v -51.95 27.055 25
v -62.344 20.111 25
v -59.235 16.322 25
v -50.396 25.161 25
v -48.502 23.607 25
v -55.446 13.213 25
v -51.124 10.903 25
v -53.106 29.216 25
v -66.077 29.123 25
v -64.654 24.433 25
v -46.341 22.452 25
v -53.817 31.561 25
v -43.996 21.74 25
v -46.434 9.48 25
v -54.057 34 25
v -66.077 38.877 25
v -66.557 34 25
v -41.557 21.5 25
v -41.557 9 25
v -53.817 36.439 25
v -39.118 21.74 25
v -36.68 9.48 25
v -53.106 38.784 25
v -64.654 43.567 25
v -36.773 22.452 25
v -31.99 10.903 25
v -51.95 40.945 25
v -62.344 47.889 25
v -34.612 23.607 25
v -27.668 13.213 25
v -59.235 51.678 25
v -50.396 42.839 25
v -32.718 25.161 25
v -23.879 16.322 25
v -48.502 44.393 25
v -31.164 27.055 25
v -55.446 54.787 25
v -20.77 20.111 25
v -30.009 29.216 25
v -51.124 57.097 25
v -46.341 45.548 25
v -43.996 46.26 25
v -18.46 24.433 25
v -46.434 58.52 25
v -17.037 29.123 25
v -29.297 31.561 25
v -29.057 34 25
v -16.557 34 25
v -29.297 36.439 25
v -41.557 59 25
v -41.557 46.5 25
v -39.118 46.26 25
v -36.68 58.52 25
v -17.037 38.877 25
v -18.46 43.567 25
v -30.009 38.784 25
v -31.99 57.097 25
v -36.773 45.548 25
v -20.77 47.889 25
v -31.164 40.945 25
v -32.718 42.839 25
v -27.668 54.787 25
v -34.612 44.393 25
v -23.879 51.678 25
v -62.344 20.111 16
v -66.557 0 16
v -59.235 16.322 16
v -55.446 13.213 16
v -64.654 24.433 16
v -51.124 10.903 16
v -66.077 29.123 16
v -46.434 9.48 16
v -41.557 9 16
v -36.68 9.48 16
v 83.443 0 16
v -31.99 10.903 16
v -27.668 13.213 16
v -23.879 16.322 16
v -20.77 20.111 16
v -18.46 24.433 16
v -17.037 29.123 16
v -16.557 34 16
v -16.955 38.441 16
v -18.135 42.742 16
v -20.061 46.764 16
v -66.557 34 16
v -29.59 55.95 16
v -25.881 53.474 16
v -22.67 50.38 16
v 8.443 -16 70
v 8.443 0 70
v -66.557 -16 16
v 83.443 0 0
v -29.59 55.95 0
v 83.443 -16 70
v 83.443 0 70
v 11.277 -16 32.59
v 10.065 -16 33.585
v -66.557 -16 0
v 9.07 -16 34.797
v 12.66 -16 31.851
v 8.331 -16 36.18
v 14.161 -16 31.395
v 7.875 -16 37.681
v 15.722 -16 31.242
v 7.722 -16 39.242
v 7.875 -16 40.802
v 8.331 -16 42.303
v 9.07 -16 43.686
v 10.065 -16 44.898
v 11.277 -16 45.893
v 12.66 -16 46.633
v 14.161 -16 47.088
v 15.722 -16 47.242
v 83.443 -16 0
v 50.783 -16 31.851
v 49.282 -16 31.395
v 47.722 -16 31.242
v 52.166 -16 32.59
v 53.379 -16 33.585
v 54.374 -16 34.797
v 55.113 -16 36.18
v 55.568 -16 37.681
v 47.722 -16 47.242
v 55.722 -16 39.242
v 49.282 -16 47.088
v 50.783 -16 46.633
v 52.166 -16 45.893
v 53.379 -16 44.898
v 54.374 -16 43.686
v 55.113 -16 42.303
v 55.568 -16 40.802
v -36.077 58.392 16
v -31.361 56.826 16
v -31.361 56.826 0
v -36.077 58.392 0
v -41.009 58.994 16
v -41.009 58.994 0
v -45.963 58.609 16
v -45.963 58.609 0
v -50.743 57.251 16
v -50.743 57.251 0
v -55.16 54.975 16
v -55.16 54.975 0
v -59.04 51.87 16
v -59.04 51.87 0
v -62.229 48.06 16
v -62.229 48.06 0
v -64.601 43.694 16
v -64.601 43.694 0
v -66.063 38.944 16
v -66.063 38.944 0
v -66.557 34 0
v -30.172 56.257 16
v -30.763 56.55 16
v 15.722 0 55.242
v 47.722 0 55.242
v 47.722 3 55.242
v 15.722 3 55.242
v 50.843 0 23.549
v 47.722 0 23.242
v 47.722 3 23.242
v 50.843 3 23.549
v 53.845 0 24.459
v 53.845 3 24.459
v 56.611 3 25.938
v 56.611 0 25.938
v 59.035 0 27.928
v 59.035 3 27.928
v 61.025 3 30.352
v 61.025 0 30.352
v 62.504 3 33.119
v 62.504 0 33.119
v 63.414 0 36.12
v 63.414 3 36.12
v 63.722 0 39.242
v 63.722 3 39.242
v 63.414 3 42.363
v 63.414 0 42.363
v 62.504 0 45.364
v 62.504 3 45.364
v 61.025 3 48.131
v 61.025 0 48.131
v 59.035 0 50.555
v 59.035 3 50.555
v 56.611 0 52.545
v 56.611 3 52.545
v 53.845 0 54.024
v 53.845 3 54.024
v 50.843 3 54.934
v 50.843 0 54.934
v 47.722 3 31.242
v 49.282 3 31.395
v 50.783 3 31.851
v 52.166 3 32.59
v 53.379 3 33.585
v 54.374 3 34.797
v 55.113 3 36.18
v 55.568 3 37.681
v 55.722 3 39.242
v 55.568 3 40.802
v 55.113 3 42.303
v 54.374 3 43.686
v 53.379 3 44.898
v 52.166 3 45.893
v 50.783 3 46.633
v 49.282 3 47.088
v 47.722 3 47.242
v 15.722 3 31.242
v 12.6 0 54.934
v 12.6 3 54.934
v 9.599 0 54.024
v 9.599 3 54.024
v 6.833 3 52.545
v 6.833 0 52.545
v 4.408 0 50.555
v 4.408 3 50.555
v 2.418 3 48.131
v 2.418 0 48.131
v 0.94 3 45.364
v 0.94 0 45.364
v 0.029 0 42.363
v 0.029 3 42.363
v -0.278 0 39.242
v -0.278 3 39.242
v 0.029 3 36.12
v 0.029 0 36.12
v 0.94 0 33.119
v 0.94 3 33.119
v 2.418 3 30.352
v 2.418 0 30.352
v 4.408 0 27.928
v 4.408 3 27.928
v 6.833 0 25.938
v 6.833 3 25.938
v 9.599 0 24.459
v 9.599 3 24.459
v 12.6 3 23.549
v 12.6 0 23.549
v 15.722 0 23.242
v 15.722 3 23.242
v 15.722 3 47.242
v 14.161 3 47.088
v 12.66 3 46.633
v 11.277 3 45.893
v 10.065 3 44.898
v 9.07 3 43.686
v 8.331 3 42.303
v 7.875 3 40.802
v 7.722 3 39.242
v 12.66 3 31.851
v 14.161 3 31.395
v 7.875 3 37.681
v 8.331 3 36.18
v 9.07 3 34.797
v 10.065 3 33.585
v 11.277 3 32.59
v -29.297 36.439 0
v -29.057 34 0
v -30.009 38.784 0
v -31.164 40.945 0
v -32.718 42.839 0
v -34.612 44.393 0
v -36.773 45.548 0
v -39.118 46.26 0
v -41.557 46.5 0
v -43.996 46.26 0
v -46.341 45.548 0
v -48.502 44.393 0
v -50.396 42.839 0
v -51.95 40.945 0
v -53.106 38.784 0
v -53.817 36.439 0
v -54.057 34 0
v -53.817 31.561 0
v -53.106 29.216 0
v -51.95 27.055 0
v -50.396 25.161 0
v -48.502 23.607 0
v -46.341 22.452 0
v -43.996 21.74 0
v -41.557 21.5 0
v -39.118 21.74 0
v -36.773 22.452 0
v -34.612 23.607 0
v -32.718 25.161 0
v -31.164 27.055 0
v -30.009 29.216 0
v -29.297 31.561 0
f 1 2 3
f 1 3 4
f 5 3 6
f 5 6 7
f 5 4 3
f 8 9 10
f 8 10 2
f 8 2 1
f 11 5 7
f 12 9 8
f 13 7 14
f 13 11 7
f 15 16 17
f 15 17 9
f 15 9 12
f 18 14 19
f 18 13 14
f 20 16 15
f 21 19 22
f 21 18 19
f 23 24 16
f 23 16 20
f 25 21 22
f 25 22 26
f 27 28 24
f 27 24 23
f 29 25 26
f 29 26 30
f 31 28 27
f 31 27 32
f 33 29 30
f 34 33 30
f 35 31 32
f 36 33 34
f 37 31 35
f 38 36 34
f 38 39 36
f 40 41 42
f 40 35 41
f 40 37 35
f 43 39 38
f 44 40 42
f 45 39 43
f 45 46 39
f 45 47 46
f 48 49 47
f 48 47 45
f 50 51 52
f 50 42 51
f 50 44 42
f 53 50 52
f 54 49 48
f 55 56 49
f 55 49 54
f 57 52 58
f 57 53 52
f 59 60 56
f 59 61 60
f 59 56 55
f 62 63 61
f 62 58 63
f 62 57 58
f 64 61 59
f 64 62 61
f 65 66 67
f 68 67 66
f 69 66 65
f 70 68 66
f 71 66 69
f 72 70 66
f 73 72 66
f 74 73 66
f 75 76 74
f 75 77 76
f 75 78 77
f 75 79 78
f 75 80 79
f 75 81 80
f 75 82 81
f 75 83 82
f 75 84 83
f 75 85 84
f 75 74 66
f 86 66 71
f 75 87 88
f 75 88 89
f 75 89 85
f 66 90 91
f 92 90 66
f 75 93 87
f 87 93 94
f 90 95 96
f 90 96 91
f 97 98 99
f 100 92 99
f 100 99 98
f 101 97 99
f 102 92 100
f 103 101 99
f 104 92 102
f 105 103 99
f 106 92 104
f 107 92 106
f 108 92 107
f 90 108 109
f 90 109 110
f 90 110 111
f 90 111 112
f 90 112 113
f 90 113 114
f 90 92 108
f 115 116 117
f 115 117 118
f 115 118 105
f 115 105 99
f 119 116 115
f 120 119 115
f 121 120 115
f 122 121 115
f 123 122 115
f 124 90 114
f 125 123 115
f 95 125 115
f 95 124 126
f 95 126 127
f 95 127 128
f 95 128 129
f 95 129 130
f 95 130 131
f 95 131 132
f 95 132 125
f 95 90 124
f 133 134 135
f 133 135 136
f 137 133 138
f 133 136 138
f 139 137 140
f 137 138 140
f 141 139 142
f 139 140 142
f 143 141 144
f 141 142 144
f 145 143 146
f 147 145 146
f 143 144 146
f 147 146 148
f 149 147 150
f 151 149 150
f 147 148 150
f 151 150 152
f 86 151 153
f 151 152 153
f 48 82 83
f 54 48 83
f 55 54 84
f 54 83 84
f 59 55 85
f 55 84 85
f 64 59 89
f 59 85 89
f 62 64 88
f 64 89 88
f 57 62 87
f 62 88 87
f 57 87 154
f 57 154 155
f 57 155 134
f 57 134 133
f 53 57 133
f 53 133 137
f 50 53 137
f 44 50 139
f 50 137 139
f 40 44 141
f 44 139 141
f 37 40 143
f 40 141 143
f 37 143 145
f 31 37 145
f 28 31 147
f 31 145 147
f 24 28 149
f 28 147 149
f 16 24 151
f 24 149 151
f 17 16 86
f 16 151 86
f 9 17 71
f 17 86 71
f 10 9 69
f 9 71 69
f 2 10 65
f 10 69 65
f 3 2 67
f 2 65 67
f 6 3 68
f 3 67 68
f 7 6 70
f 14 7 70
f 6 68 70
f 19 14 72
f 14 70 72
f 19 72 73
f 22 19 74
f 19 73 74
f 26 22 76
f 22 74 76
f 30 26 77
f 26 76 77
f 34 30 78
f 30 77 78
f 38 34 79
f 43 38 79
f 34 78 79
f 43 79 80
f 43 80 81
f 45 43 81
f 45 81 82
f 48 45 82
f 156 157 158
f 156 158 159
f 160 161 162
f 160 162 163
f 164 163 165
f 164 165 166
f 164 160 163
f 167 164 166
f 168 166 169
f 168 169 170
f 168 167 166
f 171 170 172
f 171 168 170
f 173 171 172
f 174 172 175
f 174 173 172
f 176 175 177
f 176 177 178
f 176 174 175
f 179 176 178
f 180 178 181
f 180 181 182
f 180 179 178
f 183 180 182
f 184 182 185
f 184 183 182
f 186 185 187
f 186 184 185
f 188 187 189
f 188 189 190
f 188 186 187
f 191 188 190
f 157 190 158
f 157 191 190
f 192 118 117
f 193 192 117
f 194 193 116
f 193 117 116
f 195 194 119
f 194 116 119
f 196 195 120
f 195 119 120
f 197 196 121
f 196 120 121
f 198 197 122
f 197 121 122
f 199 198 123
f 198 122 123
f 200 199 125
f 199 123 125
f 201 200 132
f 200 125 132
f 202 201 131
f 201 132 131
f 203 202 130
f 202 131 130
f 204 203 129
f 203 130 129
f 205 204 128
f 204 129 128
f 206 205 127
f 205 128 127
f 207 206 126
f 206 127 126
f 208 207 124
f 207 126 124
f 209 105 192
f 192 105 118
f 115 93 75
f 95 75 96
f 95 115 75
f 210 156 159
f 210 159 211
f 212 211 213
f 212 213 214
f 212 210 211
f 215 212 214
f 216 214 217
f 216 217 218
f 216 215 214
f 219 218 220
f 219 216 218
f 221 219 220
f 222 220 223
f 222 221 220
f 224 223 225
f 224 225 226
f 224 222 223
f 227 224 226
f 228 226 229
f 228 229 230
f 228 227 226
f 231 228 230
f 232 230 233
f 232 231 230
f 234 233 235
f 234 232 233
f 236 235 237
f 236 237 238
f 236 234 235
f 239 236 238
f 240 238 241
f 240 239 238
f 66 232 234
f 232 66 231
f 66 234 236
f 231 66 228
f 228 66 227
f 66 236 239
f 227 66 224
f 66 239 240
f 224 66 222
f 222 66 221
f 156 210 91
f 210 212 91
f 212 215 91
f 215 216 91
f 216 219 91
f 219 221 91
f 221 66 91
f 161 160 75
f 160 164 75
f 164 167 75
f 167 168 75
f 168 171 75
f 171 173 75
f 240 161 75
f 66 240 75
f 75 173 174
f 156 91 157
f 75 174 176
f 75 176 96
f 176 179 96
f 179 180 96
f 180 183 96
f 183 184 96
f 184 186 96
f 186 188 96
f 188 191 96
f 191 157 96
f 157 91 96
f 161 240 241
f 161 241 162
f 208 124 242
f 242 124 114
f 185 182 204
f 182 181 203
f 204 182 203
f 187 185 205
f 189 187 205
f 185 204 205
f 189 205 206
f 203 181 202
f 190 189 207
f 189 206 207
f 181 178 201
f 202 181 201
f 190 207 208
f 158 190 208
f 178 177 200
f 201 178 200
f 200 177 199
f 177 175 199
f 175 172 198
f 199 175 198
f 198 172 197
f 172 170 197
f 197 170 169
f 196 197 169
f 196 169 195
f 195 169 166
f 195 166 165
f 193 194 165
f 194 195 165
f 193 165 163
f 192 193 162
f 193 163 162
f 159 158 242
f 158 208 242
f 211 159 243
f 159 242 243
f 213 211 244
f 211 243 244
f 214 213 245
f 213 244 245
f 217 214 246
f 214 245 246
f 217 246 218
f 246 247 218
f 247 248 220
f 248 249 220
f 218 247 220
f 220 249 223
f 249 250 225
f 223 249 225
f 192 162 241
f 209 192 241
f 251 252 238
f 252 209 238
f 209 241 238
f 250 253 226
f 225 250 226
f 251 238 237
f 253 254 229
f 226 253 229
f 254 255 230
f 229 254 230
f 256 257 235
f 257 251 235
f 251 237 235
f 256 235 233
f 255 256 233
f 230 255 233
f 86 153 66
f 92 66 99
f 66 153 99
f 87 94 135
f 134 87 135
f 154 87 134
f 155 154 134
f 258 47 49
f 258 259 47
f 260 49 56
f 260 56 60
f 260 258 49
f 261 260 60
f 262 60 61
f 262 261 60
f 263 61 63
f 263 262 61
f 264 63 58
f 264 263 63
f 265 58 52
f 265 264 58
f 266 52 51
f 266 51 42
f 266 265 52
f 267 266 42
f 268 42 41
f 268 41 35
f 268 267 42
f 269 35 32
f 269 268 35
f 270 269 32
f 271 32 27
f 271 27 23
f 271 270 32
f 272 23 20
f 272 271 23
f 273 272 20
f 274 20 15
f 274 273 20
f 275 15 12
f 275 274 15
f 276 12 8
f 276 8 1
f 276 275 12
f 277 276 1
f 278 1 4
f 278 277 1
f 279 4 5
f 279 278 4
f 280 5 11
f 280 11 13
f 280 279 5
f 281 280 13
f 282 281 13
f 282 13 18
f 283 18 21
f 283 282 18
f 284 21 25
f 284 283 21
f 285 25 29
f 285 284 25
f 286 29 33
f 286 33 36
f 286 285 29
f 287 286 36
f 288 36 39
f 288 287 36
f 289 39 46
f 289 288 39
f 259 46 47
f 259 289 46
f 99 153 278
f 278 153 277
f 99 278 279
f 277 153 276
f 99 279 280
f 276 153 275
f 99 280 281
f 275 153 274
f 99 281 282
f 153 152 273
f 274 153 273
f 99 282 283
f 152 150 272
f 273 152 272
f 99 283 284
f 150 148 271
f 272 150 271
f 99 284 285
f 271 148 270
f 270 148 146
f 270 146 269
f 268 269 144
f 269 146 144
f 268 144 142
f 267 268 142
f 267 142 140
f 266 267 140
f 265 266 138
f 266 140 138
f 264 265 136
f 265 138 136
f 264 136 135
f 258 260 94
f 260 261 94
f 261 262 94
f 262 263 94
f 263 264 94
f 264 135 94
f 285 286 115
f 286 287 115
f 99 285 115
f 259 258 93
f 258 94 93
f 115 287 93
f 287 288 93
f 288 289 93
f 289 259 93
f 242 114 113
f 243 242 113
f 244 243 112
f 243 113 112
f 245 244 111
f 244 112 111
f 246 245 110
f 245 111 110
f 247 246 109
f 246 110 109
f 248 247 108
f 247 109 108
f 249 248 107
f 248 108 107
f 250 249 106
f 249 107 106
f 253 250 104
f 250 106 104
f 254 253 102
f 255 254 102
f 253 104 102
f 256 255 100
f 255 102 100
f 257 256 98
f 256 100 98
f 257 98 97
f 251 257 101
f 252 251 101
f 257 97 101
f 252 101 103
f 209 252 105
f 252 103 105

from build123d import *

# Parameters (mm, degrees)
SKETCH1_R           = 12.5
SKETCH1_W           = 150
SKETCH1_H           = 16
BOSS_EXTRUDE4_DEPTH = 16
SKETCH6_R           = 25
SKETCH6_R_2         = 12.5
BOSS_EXTRUDE5_DEPTH = 9
BOSS_EXTRUDE6_DEPTH = 16
CUT_EXTRUDE2_DEPTH  = 17
BOSS_EXTRUDE7_DEPTH = 3
CUT_EXTRUDE6_DEPTH  = 60


with BuildPart() as part:
    # Sketch1 → Boss-Extrude4 (new body)
    with BuildSketch(Plane.XY):
        with BuildLine():
            ThreePointArc((-31.360767673, 56.826225363), (-55.160209154, 54.975058449), (-66.55701383, 34))
            ThreePointArc((-66.55701383, 34), (-41.55701383, 9), (-16.55701383, 34))
            ThreePointArc((-16.55701383, 34), (-20.060743341, 46.763634086), (-29.589842236, 55.949642459))
            Line((-29.589842236, 55.949642459), (-31.360767673, 56.826225363))
        make_face()
        with Locations((-41.55701383, 34)):
            Circle(SKETCH1_R, mode=Mode.SUBTRACT)
        with BuildLine():
            Line((-66.55701383, 34), (-66.55701383, 0))
            Line((-66.55701383, 0), (83.44298617, 0))
            Line((83.44298617, 0), (-29.589842236, 55.949642459))
            ThreePointArc((-29.589842236, 55.949642459), (-20.060743341, 46.763634086), (-16.55701383, 34))
            ThreePointArc((-16.55701383, 34), (-41.55701383, 9), (-66.55701383, 34))
        make_face()
        with Locations((8.44298617, -8)):
            Rectangle(SKETCH1_W, SKETCH1_H)
    extrude(amount=BOSS_EXTRUDE4_DEPTH)

    # Sketch6 → Boss-Extrude5 (add)
    with BuildSketch(Plane.XY.offset(16)):
        with Locations((-41.55701383, 34)):
            Circle(SKETCH6_R)
        with Locations((-41.55701383, 34)):
            Circle(SKETCH6_R_2, mode=Mode.SUBTRACT)
    extrude(amount=BOSS_EXTRUDE5_DEPTH)

    # Sketch7 → Boss-Extrude6 (add)
    with BuildSketch(Plane.XZ.offset(16)):
        Polygon((83.44298617, 16), (83.44298617, 70), (8.44298617, 70), (-66.55701383, 16), align=None)
    extrude(amount=-BOSS_EXTRUDE6_DEPTH)

    # Sketch8 → Cut-Extrude2 (cut, through all)
    with BuildSketch(Plane(origin=(0, 0, 0), x_dir=(1, 0, 0), z_dir=(0, 1, 0))):
        with BuildLine():
            Line((47.721749713, -47.241556866), (15.721749713, -47.241556866))
            ThreePointArc((15.721749713, -47.241556866), (7.721749713, -39.241556866), (15.721749713, -31.241556866))
            Line((15.721749713, -31.241556866), (47.721749713, -31.241556866))
            ThreePointArc((47.721749713, -31.241556866), (55.721749713, -39.241556866), (47.721749713, -47.241556866))
        make_face()
    extrude(amount=-CUT_EXTRUDE2_DEPTH, mode=Mode.SUBTRACT)

    # Sketch9 → Boss-Extrude7 (add)
    with BuildSketch(Plane(origin=(0, 0, 0), x_dir=(1, 0, 0), z_dir=(0, 1, 0))):
        with BuildLine():
            Line((47.721749713, -55.241556866), (15.721749713, -55.241556866))
            ThreePointArc((15.721749713, -55.241556866), (-0.278250287, -39.241556866), (15.721749713, -23.241556866))
            Line((15.721749713, -23.241556866), (47.721749713, -23.241556866))
            ThreePointArc((47.721749713, -23.241556866), (63.721749713, -39.241556866), (47.721749713, -55.241556866))
        make_face()
    extrude(amount=BOSS_EXTRUDE7_DEPTH)

    # Sketch10 → Cut-Extrude6 (cut, through all)
    with BuildSketch(Plane(origin=(0, 0, 0), x_dir=(1, 0, 0), z_dir=(0, 1, 0))):
        with BuildLine():
            Line((47.721749713, -47.241556866), (15.721749713, -47.241556866))
            ThreePointArc((15.721749713, -47.241556866), (7.721749713, -39.241556866), (15.721749713, -31.241556866))
            Line((15.721749713, -31.241556866), (47.721749713, -31.241556866))
            ThreePointArc((47.721749713, -31.241556866), (55.721749713, -39.241556866), (47.721749713, -47.241556866))
        make_face()
    extrude(amount=CUT_EXTRUDE6_DEPTH, mode=Mode.SUBTRACT)


solid = part.part
